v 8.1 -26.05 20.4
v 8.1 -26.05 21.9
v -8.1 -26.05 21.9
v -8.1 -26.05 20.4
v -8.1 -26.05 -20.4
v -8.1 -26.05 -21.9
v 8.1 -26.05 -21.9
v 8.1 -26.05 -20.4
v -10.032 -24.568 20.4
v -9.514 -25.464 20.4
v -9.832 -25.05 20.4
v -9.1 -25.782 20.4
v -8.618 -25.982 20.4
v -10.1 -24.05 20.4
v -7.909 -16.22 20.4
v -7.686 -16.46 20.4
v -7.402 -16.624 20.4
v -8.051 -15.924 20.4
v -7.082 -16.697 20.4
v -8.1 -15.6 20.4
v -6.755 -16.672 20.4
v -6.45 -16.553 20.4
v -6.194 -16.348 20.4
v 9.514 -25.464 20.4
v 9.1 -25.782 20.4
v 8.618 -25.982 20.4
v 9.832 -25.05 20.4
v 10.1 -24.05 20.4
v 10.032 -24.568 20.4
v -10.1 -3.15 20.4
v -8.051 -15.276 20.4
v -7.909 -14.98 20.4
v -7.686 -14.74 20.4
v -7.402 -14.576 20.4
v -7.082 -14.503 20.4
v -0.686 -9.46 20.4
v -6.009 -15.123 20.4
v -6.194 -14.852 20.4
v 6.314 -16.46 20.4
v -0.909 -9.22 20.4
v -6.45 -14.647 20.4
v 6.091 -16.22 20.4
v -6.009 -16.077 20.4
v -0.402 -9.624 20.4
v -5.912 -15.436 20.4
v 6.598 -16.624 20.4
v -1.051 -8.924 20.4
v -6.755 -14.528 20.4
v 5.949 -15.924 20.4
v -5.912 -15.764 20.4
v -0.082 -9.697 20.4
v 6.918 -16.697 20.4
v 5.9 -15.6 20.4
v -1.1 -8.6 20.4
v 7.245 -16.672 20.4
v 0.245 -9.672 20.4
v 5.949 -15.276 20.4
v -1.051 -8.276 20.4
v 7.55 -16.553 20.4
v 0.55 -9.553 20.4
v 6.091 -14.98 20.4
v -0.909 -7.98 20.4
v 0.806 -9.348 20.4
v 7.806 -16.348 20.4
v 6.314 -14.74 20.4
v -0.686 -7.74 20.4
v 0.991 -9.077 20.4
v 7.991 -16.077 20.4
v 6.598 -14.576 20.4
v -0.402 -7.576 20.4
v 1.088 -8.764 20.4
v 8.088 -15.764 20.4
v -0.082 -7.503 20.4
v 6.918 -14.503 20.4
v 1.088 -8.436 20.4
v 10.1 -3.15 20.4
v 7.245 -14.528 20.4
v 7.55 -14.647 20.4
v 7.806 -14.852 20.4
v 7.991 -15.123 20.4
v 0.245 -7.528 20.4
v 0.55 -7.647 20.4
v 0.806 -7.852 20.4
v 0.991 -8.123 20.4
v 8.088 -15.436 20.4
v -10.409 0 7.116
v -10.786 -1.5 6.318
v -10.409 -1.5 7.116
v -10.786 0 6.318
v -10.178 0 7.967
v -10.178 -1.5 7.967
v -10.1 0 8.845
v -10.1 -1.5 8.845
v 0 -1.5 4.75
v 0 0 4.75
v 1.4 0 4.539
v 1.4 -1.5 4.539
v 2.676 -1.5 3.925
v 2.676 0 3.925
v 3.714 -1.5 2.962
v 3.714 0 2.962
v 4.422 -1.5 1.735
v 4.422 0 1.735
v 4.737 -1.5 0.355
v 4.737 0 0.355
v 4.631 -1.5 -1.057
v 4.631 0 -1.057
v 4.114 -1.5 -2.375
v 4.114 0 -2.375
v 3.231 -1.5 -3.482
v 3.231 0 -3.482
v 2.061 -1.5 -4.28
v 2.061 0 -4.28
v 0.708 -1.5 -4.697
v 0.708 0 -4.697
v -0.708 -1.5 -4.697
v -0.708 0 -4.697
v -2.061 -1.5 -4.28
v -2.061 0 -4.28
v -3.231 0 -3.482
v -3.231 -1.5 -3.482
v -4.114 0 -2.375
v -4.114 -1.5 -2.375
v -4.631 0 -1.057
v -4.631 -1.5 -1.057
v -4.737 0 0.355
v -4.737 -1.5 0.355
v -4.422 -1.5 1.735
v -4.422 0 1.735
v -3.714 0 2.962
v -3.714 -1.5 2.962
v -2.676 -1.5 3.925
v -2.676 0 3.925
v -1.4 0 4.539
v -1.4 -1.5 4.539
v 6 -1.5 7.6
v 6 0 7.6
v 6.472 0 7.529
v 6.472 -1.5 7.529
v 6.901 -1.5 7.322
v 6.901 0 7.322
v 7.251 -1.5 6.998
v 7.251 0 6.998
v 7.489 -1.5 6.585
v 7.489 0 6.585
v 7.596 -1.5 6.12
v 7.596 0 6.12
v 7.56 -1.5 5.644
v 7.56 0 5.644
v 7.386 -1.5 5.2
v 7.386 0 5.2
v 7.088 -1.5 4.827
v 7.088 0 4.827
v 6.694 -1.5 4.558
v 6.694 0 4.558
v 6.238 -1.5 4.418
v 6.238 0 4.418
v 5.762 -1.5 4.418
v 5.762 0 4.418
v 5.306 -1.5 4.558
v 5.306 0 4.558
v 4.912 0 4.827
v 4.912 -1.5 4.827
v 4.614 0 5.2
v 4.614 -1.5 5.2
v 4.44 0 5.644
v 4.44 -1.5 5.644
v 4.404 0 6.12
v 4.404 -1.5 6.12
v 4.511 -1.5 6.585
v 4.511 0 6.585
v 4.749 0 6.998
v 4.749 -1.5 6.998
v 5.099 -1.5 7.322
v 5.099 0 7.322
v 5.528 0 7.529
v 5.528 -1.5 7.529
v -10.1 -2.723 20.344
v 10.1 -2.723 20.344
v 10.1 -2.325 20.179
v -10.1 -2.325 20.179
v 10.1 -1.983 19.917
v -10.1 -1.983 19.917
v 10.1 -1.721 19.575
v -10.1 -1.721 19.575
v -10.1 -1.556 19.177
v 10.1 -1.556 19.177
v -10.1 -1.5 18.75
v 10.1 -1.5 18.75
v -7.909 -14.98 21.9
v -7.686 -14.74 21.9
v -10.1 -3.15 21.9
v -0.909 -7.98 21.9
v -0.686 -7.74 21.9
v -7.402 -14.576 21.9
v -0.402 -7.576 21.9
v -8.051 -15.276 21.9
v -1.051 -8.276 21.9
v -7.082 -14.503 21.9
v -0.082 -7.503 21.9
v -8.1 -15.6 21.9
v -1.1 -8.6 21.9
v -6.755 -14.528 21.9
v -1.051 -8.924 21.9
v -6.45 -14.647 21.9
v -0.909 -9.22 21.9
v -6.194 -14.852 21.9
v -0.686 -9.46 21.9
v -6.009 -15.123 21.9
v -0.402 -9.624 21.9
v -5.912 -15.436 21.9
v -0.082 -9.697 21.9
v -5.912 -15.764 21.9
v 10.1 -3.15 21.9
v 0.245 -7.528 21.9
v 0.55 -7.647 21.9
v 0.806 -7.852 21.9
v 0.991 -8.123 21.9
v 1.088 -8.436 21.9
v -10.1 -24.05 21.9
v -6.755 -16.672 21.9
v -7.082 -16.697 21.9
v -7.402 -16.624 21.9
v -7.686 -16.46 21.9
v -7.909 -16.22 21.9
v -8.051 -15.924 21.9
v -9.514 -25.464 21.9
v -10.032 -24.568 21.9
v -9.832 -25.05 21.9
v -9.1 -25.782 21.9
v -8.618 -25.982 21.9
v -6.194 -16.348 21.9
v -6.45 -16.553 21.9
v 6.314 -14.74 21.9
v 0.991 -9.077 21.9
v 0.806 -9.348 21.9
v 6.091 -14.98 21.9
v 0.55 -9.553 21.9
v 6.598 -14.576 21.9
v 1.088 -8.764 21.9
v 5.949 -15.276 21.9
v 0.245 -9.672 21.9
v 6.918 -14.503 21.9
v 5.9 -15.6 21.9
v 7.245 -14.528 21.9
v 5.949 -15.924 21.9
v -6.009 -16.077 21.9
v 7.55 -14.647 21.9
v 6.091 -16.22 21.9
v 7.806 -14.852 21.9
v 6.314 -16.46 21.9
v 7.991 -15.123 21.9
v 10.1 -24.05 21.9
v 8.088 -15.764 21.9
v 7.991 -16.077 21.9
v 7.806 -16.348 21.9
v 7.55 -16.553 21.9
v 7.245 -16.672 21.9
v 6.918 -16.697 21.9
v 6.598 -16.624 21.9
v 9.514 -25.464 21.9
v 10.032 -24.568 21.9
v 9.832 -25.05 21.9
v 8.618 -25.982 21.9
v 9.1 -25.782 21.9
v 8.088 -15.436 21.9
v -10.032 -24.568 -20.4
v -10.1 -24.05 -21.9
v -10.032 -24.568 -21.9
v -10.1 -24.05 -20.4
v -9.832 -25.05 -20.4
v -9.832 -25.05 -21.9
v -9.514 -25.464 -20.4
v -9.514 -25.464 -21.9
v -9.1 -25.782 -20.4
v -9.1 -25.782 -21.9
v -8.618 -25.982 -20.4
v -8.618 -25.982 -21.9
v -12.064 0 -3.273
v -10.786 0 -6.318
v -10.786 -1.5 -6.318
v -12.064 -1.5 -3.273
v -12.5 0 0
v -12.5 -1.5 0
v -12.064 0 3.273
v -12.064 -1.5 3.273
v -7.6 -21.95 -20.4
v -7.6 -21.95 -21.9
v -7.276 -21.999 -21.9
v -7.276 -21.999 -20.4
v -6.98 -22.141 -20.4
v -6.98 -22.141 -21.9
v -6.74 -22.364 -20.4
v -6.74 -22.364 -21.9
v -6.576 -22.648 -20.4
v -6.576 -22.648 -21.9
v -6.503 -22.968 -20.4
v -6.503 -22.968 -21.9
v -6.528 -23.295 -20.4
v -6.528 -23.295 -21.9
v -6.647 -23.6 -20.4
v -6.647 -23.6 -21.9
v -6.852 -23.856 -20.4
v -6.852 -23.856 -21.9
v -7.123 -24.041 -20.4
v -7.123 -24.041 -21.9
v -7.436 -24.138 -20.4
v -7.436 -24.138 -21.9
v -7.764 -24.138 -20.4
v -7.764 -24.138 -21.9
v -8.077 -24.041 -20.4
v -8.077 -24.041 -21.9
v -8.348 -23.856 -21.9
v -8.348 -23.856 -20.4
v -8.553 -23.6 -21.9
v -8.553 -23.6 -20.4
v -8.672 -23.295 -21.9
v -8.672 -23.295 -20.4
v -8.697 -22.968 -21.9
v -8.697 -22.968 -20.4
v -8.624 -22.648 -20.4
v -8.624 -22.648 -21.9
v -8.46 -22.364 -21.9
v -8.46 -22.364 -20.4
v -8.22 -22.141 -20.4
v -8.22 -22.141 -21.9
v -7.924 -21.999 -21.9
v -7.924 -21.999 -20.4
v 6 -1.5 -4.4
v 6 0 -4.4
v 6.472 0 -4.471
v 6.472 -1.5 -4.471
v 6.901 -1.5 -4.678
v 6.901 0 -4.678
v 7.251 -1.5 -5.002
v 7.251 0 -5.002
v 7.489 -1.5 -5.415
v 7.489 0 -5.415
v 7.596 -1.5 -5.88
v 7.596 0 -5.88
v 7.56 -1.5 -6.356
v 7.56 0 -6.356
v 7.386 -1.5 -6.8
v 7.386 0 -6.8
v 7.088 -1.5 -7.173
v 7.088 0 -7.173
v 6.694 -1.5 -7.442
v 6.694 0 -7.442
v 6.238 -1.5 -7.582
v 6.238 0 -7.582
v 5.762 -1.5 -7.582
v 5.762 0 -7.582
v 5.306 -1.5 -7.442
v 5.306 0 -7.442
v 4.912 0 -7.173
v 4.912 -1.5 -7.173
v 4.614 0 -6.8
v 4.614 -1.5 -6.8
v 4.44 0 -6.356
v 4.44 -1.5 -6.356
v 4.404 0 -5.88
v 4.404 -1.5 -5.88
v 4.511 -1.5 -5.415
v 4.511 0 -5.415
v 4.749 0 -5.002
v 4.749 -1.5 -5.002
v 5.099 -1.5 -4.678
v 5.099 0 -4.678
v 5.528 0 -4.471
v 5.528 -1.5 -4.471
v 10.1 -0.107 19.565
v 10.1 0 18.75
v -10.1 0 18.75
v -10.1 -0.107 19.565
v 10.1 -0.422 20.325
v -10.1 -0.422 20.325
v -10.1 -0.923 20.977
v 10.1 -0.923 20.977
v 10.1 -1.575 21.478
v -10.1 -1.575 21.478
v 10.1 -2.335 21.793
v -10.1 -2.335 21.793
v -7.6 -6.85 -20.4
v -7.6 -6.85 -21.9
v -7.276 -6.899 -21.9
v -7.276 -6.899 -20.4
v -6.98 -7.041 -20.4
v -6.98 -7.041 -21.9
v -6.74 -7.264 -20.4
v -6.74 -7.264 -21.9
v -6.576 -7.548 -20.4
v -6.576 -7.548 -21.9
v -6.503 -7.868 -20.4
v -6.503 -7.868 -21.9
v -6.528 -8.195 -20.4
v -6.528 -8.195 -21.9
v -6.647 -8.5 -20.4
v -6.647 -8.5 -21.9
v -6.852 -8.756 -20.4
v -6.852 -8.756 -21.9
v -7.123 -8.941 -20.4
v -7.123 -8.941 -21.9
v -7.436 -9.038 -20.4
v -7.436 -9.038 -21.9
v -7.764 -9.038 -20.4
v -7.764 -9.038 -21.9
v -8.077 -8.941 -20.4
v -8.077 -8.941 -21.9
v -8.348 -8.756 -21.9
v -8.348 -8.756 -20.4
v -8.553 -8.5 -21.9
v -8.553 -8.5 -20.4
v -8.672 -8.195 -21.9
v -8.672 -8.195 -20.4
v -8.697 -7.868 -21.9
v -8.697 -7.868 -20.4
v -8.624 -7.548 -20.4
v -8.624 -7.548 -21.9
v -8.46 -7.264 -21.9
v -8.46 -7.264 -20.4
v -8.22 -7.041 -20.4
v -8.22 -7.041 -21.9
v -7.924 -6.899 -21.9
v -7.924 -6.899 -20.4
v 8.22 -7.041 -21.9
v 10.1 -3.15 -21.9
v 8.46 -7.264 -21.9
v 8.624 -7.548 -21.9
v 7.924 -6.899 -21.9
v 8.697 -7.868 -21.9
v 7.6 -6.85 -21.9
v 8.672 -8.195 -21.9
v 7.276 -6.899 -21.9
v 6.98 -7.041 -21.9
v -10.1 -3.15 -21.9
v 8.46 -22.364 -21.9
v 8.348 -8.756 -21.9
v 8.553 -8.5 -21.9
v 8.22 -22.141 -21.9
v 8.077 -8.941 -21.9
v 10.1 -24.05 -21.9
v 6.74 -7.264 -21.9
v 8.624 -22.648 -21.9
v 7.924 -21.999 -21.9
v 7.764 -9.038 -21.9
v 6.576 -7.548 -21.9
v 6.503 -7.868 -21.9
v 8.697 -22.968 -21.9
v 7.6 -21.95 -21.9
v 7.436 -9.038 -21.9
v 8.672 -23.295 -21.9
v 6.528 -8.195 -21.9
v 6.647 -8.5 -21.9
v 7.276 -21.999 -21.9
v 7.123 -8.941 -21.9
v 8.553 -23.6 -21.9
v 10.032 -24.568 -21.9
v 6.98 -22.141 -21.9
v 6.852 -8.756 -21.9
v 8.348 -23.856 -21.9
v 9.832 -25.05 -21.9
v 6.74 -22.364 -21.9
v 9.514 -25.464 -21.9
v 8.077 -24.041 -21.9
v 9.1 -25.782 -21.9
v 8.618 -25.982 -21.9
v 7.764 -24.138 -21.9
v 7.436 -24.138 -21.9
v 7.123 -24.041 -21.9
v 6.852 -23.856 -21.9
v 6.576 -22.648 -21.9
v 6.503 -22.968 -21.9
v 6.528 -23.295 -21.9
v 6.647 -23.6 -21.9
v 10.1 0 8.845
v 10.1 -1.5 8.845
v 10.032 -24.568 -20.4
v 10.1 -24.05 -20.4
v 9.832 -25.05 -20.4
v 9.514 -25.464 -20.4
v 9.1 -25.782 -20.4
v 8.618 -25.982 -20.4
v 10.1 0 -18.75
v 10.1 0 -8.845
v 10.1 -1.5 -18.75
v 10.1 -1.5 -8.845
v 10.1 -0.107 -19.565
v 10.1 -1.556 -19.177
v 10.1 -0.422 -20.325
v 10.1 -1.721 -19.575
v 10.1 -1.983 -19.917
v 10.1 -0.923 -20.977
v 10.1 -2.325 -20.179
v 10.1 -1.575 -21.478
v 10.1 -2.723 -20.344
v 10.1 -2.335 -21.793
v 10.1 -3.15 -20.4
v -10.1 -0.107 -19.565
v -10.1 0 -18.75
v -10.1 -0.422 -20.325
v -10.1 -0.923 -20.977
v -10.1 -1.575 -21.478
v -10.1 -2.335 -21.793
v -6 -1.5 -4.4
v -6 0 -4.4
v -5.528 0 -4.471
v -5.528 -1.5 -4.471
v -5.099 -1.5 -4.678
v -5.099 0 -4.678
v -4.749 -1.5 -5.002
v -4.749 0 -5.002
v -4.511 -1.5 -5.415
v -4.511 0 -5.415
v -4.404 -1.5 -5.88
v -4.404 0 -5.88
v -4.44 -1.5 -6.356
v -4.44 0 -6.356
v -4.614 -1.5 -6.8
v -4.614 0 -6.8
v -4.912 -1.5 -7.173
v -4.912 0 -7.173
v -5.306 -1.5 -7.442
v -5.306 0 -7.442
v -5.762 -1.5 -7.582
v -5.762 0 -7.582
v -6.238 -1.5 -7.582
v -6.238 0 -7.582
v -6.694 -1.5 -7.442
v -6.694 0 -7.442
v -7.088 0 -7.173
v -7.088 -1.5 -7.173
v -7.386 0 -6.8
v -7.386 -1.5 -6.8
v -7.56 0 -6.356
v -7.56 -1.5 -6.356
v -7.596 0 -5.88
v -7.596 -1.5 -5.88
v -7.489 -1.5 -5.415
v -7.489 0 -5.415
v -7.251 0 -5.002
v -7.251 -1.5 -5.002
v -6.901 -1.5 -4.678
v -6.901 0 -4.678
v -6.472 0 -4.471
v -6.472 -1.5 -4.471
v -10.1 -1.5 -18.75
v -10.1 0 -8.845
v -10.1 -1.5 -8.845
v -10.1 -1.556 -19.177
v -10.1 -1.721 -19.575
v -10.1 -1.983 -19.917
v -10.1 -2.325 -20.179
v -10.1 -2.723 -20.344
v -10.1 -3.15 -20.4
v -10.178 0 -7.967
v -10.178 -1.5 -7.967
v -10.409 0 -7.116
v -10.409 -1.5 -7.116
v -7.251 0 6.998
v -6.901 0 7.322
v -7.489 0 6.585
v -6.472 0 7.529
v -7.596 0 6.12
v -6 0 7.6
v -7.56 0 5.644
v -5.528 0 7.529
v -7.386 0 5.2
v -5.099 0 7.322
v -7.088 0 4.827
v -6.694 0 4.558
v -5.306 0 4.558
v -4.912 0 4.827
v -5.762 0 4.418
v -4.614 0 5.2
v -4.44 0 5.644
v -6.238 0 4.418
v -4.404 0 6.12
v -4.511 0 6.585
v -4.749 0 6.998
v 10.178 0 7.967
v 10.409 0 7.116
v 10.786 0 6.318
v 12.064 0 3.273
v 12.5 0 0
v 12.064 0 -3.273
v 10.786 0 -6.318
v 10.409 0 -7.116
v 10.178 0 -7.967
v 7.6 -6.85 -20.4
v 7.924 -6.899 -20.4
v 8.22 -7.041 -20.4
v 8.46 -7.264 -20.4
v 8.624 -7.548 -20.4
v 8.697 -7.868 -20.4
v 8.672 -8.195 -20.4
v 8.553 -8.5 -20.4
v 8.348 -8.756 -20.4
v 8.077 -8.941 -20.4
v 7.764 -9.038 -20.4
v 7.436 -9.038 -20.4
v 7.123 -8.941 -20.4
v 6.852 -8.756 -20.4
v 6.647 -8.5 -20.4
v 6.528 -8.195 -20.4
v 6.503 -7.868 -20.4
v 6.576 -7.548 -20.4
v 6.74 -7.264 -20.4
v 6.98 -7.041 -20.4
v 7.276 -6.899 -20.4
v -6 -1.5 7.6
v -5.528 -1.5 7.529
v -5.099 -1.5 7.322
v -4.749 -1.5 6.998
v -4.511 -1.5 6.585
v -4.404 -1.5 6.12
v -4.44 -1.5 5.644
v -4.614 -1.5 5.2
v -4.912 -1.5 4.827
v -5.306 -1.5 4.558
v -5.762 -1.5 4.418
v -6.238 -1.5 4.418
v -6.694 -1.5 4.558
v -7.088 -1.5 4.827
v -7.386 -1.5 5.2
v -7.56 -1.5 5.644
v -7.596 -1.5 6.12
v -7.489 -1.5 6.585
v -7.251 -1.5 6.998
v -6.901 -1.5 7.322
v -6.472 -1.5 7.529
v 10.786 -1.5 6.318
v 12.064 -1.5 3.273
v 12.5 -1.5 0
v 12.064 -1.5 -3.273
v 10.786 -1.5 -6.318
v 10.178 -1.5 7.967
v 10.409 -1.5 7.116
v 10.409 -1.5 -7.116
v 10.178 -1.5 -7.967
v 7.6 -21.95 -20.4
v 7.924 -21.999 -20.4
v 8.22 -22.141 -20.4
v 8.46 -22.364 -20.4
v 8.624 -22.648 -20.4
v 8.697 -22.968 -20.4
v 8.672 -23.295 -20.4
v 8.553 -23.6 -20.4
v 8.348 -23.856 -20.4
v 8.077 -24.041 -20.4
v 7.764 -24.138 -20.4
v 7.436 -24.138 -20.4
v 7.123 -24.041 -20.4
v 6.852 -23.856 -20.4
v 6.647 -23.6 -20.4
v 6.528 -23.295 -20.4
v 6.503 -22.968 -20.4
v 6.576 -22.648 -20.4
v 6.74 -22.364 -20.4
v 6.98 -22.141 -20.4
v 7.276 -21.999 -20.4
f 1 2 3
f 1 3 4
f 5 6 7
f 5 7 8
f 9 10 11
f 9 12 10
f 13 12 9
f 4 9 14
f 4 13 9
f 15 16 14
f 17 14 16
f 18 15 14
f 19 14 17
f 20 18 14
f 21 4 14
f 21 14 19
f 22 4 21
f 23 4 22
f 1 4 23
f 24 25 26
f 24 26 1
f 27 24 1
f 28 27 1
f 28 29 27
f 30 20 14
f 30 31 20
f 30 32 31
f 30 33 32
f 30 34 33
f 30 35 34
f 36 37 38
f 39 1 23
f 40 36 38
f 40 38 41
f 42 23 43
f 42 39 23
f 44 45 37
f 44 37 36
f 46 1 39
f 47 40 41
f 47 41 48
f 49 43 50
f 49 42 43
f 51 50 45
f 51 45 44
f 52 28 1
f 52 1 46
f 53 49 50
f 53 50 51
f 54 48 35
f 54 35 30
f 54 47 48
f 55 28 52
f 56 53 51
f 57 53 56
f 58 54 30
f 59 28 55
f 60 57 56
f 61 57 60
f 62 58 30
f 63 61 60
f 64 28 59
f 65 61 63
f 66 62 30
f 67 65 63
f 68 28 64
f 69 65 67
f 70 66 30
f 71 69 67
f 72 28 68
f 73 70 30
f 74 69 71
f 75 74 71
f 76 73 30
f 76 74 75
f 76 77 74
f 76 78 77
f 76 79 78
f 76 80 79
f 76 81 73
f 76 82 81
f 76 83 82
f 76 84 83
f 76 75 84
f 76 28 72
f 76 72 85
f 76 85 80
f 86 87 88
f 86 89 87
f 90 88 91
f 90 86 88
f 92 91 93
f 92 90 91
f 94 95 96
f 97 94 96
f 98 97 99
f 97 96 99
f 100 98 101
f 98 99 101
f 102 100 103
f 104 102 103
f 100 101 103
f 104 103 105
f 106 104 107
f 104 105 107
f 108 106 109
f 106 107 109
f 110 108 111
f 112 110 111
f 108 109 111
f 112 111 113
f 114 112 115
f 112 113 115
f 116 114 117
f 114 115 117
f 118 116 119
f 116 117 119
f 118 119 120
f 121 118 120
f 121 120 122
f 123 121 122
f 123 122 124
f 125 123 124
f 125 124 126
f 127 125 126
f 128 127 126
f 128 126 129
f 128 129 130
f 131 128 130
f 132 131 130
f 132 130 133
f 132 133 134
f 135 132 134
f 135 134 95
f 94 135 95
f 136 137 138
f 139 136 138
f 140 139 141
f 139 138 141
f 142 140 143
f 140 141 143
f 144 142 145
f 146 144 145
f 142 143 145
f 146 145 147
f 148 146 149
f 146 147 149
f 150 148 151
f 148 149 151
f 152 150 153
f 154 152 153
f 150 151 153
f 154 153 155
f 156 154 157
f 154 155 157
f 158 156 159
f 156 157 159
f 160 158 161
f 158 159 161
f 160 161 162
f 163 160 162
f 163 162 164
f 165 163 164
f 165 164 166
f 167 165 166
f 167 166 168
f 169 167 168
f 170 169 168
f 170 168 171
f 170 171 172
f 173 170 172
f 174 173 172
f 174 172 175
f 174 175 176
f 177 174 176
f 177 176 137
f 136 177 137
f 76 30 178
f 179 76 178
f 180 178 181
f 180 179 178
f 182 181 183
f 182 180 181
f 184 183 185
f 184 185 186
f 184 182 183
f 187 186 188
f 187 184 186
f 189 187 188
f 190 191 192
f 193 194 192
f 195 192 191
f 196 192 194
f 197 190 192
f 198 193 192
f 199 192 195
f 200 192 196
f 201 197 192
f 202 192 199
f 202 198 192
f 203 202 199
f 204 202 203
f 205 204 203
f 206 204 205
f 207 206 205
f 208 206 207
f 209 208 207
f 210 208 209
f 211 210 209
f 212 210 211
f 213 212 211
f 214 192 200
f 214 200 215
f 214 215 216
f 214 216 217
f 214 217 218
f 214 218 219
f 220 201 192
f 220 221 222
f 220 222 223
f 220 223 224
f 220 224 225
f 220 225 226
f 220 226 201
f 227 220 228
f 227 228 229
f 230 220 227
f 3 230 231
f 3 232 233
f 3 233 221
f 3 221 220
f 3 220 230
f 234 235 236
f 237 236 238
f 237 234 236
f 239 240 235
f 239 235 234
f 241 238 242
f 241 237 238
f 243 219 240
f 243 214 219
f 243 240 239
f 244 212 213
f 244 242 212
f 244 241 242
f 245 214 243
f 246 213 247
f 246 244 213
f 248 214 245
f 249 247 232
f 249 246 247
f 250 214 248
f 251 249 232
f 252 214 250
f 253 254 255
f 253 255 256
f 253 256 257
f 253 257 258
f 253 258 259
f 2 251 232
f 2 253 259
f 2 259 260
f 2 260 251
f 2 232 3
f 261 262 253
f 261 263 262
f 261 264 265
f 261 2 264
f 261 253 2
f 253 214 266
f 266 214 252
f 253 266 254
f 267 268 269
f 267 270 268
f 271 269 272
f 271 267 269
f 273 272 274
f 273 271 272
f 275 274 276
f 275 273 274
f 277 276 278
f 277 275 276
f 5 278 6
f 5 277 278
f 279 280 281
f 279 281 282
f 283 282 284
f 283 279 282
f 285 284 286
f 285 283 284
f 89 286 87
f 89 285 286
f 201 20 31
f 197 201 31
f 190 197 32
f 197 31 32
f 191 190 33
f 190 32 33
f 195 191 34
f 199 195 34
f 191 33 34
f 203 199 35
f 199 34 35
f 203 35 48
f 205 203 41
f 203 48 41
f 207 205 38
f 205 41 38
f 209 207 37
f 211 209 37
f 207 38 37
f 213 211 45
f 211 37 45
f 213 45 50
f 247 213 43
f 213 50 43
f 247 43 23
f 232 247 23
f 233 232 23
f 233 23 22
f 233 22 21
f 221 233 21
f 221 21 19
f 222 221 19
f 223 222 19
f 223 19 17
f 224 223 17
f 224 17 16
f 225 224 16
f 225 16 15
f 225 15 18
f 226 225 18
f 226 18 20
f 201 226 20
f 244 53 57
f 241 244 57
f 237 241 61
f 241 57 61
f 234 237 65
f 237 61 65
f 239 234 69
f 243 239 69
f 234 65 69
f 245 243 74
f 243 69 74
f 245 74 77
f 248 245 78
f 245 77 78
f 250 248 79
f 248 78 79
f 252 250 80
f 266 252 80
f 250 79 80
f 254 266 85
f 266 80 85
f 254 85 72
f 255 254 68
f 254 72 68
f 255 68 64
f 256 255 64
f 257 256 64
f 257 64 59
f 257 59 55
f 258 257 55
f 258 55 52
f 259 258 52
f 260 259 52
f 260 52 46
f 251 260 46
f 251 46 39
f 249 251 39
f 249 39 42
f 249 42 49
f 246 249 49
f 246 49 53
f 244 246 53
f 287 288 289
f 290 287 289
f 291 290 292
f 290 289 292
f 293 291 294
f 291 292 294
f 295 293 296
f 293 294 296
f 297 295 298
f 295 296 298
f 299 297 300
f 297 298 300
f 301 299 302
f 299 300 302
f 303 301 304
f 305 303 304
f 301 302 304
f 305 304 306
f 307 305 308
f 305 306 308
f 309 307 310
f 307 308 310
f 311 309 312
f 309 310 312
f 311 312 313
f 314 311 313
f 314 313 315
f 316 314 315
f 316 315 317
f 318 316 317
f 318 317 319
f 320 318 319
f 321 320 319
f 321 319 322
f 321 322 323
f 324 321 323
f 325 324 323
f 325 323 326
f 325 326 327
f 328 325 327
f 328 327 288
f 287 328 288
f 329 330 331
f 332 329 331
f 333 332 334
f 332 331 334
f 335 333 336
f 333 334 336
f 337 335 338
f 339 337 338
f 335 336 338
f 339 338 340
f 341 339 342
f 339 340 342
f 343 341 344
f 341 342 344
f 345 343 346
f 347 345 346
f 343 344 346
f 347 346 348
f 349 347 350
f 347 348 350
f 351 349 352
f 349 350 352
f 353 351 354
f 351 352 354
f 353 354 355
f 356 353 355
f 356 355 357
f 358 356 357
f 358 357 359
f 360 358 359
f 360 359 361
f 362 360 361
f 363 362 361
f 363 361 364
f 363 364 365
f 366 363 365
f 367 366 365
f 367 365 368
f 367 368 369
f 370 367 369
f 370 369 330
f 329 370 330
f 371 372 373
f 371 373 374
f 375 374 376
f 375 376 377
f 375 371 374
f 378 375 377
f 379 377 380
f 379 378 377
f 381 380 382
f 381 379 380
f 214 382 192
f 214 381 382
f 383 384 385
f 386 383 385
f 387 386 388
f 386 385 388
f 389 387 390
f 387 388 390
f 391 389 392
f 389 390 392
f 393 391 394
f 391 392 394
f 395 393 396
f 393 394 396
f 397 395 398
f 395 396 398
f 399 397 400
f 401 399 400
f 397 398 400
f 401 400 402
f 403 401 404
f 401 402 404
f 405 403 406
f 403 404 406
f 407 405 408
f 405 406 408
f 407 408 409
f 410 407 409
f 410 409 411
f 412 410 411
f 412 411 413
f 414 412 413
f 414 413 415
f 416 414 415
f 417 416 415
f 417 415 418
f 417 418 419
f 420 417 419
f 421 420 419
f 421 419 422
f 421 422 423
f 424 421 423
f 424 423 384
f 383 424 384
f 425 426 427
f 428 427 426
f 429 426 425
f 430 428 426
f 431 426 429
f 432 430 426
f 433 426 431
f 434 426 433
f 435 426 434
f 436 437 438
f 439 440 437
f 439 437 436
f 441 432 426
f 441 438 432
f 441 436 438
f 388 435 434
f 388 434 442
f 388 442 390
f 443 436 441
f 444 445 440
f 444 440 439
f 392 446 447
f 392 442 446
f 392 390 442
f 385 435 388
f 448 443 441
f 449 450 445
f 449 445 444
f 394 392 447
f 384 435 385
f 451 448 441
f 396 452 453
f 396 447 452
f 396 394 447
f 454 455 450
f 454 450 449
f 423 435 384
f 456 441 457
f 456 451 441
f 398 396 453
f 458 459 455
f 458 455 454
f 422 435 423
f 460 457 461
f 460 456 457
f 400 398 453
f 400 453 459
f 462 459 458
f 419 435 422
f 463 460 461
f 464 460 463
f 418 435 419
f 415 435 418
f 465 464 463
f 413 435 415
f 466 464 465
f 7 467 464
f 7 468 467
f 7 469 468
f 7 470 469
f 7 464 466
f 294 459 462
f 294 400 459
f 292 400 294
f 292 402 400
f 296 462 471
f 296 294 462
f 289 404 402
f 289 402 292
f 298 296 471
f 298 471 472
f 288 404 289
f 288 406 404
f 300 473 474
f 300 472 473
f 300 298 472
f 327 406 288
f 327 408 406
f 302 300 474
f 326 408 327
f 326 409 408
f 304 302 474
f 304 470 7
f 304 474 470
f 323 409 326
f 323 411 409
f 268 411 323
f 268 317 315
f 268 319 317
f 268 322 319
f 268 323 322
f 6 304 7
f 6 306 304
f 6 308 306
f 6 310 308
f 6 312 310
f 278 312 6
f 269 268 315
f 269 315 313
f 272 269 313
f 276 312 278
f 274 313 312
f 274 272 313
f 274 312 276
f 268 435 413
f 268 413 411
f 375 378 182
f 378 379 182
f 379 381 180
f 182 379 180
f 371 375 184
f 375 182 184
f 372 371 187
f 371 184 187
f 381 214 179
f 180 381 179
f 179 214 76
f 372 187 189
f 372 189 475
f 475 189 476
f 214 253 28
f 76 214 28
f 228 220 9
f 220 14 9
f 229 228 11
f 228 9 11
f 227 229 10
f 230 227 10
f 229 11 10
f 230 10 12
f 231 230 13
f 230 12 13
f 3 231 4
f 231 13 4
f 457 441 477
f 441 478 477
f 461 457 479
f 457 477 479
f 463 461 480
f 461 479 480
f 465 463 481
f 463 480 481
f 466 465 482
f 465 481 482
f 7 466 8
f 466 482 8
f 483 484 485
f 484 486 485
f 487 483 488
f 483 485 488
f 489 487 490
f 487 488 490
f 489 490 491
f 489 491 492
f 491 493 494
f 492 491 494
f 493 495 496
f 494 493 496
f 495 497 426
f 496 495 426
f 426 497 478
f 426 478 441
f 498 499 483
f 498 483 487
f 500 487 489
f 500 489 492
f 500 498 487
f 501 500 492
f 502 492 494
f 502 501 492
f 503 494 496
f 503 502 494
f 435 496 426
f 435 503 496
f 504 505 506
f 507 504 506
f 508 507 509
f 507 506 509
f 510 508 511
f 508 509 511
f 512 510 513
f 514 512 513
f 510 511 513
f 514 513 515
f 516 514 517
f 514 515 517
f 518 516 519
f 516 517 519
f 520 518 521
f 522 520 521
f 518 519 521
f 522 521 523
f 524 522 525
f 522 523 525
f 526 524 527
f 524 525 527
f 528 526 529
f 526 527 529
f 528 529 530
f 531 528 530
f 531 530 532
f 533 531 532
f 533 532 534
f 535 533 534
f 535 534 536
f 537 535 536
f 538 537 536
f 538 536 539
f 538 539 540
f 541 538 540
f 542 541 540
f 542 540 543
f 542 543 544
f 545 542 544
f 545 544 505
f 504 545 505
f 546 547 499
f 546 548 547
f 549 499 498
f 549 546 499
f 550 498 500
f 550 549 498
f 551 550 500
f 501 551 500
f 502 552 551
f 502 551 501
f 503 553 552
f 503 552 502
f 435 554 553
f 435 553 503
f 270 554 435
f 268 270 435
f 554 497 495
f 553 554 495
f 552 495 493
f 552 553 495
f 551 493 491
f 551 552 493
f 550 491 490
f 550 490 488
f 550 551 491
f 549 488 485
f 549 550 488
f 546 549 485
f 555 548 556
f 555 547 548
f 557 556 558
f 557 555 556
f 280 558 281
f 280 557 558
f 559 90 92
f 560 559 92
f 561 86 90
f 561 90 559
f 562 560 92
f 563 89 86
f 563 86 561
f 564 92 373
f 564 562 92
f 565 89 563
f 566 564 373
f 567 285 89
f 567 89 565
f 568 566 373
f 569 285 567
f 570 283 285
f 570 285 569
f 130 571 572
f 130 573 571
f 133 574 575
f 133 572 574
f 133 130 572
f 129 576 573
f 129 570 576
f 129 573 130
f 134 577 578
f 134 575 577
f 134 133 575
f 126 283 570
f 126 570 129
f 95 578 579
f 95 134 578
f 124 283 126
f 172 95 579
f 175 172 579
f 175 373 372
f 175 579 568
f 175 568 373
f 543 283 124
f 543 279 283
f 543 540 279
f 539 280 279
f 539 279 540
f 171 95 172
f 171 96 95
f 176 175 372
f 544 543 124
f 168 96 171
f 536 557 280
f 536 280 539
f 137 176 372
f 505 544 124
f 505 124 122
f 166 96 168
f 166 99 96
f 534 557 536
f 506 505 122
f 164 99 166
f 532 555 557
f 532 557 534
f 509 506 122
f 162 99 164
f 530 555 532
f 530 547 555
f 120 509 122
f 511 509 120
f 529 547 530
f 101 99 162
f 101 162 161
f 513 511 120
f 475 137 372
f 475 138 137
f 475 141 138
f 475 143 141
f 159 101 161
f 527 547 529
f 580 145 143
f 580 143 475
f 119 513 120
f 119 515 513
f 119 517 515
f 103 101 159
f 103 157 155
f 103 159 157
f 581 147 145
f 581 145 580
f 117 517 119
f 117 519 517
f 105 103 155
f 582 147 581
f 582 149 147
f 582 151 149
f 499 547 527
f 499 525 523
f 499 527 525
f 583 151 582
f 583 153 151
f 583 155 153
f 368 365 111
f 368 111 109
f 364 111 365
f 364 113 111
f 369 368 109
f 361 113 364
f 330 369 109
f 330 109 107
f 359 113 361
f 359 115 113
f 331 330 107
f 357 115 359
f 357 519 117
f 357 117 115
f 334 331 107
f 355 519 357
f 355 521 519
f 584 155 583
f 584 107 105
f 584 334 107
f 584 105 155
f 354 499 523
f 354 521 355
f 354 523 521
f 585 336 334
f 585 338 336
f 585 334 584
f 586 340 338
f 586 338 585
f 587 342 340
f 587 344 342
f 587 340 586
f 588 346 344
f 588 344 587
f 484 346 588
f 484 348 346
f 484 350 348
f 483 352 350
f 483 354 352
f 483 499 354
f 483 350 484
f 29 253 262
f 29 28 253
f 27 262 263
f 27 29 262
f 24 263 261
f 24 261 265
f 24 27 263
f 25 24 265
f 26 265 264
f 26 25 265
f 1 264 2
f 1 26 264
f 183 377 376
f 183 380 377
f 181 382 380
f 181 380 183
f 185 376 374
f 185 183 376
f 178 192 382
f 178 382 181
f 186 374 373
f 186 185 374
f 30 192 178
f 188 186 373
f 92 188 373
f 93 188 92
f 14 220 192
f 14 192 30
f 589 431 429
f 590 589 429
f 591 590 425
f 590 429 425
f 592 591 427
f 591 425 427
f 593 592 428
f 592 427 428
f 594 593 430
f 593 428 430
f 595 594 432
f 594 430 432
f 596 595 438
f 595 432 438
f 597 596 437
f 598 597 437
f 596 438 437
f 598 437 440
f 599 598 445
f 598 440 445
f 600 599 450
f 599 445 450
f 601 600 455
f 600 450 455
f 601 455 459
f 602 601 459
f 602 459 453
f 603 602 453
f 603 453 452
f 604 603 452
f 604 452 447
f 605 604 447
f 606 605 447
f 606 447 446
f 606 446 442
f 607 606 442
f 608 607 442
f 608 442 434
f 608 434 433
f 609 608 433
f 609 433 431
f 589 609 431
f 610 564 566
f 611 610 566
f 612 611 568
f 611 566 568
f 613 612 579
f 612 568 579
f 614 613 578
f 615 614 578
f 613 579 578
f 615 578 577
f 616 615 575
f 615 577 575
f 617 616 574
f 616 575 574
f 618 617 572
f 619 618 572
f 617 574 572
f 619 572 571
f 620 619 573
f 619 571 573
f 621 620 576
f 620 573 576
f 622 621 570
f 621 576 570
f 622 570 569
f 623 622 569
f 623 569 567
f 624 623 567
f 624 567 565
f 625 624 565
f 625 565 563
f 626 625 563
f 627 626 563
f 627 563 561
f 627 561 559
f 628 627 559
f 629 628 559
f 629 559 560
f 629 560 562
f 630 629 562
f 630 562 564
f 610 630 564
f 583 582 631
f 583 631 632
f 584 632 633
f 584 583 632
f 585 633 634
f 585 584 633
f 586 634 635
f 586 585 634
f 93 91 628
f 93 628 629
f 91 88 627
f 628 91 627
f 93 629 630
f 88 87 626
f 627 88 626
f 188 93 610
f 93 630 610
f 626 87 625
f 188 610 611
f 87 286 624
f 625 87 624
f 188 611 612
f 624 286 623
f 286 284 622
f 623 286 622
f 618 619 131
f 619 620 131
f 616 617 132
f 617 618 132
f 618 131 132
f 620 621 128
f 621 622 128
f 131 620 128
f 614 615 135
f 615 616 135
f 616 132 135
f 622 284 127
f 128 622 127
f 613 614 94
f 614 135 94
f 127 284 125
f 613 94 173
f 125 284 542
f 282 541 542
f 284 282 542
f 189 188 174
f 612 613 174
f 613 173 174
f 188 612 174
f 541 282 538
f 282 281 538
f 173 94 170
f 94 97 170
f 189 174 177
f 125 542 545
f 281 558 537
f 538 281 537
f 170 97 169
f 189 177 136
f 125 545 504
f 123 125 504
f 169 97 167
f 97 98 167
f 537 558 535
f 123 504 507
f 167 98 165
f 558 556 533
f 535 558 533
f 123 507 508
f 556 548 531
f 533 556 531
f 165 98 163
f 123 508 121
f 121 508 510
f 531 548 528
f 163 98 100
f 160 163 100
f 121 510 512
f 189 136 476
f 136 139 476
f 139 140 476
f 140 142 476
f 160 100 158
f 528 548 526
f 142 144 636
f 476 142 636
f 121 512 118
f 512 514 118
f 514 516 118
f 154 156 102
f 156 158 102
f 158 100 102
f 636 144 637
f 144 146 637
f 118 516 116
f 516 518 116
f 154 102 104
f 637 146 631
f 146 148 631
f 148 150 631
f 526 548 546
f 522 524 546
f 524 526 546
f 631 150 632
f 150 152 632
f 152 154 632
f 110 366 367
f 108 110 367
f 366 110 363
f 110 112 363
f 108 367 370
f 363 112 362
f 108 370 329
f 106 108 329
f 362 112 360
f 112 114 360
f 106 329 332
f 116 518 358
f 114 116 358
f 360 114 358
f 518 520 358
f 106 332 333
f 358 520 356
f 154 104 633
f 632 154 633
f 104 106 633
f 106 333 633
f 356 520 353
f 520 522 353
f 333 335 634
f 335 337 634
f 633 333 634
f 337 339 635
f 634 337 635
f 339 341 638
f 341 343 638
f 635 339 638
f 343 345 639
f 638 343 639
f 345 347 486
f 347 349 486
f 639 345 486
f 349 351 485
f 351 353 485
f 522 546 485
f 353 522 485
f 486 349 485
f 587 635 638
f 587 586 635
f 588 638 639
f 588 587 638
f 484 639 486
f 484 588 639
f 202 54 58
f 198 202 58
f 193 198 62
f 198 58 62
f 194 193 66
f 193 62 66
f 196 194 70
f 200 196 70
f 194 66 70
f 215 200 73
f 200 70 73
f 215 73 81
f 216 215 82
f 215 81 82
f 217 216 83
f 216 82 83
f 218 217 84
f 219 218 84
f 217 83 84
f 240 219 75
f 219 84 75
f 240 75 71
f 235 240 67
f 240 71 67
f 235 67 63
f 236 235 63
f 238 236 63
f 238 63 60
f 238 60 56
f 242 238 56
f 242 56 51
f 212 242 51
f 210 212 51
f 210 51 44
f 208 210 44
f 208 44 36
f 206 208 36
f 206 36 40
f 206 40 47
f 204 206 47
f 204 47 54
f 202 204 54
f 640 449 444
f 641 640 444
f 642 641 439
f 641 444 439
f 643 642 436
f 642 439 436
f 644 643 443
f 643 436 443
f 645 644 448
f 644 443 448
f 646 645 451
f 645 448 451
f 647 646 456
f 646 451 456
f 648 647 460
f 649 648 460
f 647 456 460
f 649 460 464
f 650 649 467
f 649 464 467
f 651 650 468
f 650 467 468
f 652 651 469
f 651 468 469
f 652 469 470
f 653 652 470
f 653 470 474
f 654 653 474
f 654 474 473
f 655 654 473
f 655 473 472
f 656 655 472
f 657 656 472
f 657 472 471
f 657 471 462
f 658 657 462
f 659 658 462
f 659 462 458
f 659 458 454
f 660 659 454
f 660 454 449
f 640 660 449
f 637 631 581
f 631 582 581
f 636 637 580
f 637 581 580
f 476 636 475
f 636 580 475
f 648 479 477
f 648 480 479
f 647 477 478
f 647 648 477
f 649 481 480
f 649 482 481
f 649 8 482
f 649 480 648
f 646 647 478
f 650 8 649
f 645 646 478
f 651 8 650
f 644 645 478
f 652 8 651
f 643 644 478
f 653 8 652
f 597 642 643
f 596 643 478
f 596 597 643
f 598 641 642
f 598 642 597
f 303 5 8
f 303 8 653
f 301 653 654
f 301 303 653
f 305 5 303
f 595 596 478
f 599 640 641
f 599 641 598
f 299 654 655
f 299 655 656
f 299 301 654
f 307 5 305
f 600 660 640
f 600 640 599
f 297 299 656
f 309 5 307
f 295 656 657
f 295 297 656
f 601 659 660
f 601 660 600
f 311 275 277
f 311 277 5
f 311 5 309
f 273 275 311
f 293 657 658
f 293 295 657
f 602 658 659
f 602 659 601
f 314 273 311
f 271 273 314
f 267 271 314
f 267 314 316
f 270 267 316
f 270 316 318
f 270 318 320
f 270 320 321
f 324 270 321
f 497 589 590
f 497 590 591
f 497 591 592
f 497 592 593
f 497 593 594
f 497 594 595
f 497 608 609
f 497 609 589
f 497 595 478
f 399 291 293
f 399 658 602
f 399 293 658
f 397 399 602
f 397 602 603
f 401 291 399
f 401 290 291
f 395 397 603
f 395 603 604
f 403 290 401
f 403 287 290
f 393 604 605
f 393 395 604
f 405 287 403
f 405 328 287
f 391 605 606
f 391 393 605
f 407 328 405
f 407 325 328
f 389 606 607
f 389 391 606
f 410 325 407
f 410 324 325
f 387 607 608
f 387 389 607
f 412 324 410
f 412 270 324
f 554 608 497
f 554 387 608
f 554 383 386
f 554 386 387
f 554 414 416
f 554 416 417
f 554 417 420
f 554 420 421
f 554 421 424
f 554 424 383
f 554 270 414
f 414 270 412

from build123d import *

# Parameters (mm, degrees)
SKETCH1_W                      = 20.2
SKETCH1_H                      = 40.8
BASE_FLANGE1_DEPTH             = 1.5
EDGE_FLANGE1_STRIP_W           = 9.3
EDGE_FLANGE1_STRIP_H           = 1.5
EDGE_FLANGE1_STRIP_CUT_DEPTH   = 20.2
EDGE_FLANGE1_STRIP_2_W         = 9.3
EDGE_FLANGE1_STRIP_2_H         = 1.5
EDGE_FLANGE1_STRIP_CUT_2_DEPTH = 20.2
EDGE_FLANGE1_DEPTH             = 20.2
EDGE_FLANGE1_BEND_DEPTH        = 20.2
CUT_EXTRUDE1_REACH             = 53.952
SKETCH12_R                     = 1.1
FILLET1_R                      = 2
F_2_0MM_DOWEL_HOLE1_D          = 2.2
F_2_0MM_DOWEL_HOLE1_DEPTH      = 1.5
SKETCH15_R                     = 12.5
TAB1_DEPTH                     = 1.5
FILLET2_R                      = 5
CUT_EXTRUDE2_REACH             = 38.256
SKETCH18_R                     = 1.6
SKETCH18_R_2                   = 4.75


# Sheet-metal steps are written as plain solids
with BuildPart() as part:
    # Sketch1 → Base-Flange1 (new body)
    with BuildSketch(Plane(origin=(0, 0, 0), x_dir=(1, 0, 0), z_dir=(0, 1, 0))):
        Rectangle(SKETCH1_W, SKETCH1_H)
    extrude(amount=-BASE_FLANGE1_DEPTH)

    # Edge-Flange1 strip (across the edge) → Edge-Flange1 strip cut (cut)
    with BuildSketch(Plane(origin=(10.1, -1.5, 20.4), x_dir=(0, 0, -1), z_dir=(-1, 0, 0))):
        with Locations((-3, -0.75)):
            Rectangle(EDGE_FLANGE1_STRIP_W, EDGE_FLANGE1_STRIP_H)
    extrude(amount=EDGE_FLANGE1_STRIP_CUT_DEPTH, mode=Mode.SUBTRACT)

    # Edge-Flange1 strip 2 (across the edge) → Edge-Flange1 strip cut 2 (cut)
    with BuildSketch(Plane(origin=(-10.1, -1.5, -20.4), x_dir=(0, 0, 1), z_dir=(1, 0, 0))):
        with Locations((-3, -0.75)):
            Rectangle(EDGE_FLANGE1_STRIP_2_W, EDGE_FLANGE1_STRIP_2_H)
    extrude(amount=EDGE_FLANGE1_STRIP_CUT_2_DEPTH, mode=Mode.SUBTRACT)

    # Edge-Flange1 section (across the edge) → Edge-Flange1 (add)
    with BuildSketch(Plane(origin=(10.1, -1.5, 20.4), x_dir=(0, 0, -1), z_dir=(-1, 0, 0))):
        with BuildLine():
            Line((-1.5, 1.65), (-1.5, 24.55))
            Line((-1.5, 24.55), (0, 24.55))
            Line((0, 24.55), (0, 1.65))
            ThreePointArc((0, 1.65), (0.483273811, 0.483273811), (1.65, 0))
            Line((1.65, 0), (1.65, -1.5))
            ThreePointArc((1.65, -1.5), (-0.577386361, -0.577386361), (-1.5, 1.65))
        make_face()
    extrude(amount=EDGE_FLANGE1_DEPTH)

    # Edge-Flange1 section 2 (across the edge) → Edge-Flange1 bend (add)
    with BuildSketch(Plane(origin=(-10.1, -1.5, -20.4), x_dir=(0, 0, 1), z_dir=(1, 0, 0))):
        with BuildLine():
            Line((-1.5, 1.65), (-1.5, 24.55))
            Line((-1.5, 24.55), (0, 24.55))
            Line((0, 24.55), (0, 1.65))
            ThreePointArc((0, 1.65), (0.483273811, 0.483273811), (1.65, 0))
            Line((1.65, 0), (1.65, -1.5))
            ThreePointArc((1.65, -1.5), (-0.577386361, -0.577386361), (-1.5, 1.65))
        make_face()
    extrude(amount=EDGE_FLANGE1_BEND_DEPTH)

    # Sketch12 → Cut-Extrude1 (cut, up to next)
    with BuildSketch(Plane(origin=(0, 0, -21.9), x_dir=(-1, 0, 0), z_dir=(0, 0, -1)), mode=Mode.PRIVATE) as cut_extrude1_sk1:
        with Locations(Location((-7.6, -7.95, 0), (0, 0, 90))):
            Circle(SKETCH12_R)
    cut_extrude1_tool1 = extrude(cut_extrude1_sk1.sketch, amount=-CUT_EXTRUDE1_REACH, mode=Mode.PRIVATE) & part.part
    # Sketch12 → Cut-Extrude1 (cut, up to next)
    with BuildSketch(Plane(origin=(0, 0, -21.9), x_dir=(-1, 0, 0), z_dir=(0, 0, -1)), mode=Mode.PRIVATE) as cut_extrude1_sk2:
        with Locations(Location((7.6, -7.95, 0), (0, 0, 90))):
            Circle(SKETCH12_R)
    cut_extrude1_tool2 = extrude(cut_extrude1_sk2.sketch, amount=-CUT_EXTRUDE1_REACH, mode=Mode.PRIVATE) & part.part
    # Sketch12 → Cut-Extrude1 (cut, up to next)
    with BuildSketch(Plane(origin=(0, 0, -21.9), x_dir=(-1, 0, 0), z_dir=(0, 0, -1)), mode=Mode.PRIVATE) as cut_extrude1_sk3:
        with Locations(Location((7.6, -23.05, 0), (0, 0, 90))):
            Circle(SKETCH12_R)
    cut_extrude1_tool3 = extrude(cut_extrude1_sk3.sketch, amount=-CUT_EXTRUDE1_REACH, mode=Mode.PRIVATE) & part.part
    # Sketch12 → Cut-Extrude1 (cut, up to next)
    with BuildSketch(Plane(origin=(0, 0, -21.9), x_dir=(-1, 0, 0), z_dir=(0, 0, -1)), mode=Mode.PRIVATE) as cut_extrude1_sk4:
        with Locations(Location((-7.6, -23.05, 0), (0, 0, 90))):
            Circle(SKETCH12_R)
    cut_extrude1_tool4 = extrude(cut_extrude1_sk4.sketch, amount=-CUT_EXTRUDE1_REACH, mode=Mode.PRIVATE) & part.part
    add(cut_extrude1_tool1.solids().sort_by_distance((7.6, -7.95, -21.9))[0], mode=Mode.SUBTRACT)
    add(cut_extrude1_tool2.solids().sort_by_distance((-7.6, -7.95, -21.9))[0], mode=Mode.SUBTRACT)
    add(cut_extrude1_tool3.solids().sort_by_distance((-7.6, -23.05, -21.9))[0], mode=Mode.SUBTRACT)
    add(cut_extrude1_tool4.solids().sort_by_distance((7.6, -23.05, -21.9))[0], mode=Mode.SUBTRACT)

    # Fillet1
    fillet1_edges = [part.edges().sort_by_distance(p)[0] for p in [
        (10.1, -26.05, 21.15),
        (-10.1, -26.05, 21.15),
        (-10.1, -26.05, -21.15),
        (10.1, -26.05, -21.15),
    ]]
    fillet(fillet1_edges, radius=FILLET1_R)

    # Ø2.0mm Dowel Hole1
    with Locations(Plane.XY.offset(21.9)):
        with Locations((-7, -15.6), (0, -8.6), (7, -15.6)):
            Hole(F_2_0MM_DOWEL_HOLE1_D / 2, depth=F_2_0MM_DOWEL_HOLE1_DEPTH)

    # Sketch15 → Tab1 (add)
    with BuildSketch(Plane(origin=(0, 0, 0), x_dir=(1, 0, 0), z_dir=(0, 1, 0))):
        Circle(SKETCH15_R)
    extrude(amount=-TAB1_DEPTH)

    # Fillet2
    fillet2_edges = [part.edges().sort_by_distance(p)[0] for p in [
        (-10.1, -0.75, -7.364781056),
        (-10.1, -0.75, 7.364781056),
        (10.1, -0.75, -7.364781056),
        (10.1, -0.75, 7.364781056),
    ]]
    fillet(fillet2_edges, radius=FILLET2_R)

    # Sketch18 → Cut-Extrude2 (cut, up to next)
    with BuildSketch(Plane(origin=(0, 0, 0), x_dir=(1, 0, 0), z_dir=(0, 1, 0)), mode=Mode.PRIVATE) as cut_extrude2_sk1:
        with Locations(Location((-6, 6, 0), (0, 0, 270))):
            Circle(SKETCH18_R)
    cut_extrude2_tool1 = extrude(cut_extrude2_sk1.sketch, amount=-CUT_EXTRUDE2_REACH, mode=Mode.PRIVATE) & part.part
    # Sketch18 → Cut-Extrude2 (cut, up to next)
    with BuildSketch(Plane(origin=(0, 0, 0), x_dir=(1, 0, 0), z_dir=(0, 1, 0)), mode=Mode.PRIVATE) as cut_extrude2_sk2:
        with Locations(Location((6, 6, 0), (0, 0, 270))):
            Circle(SKETCH18_R)
    cut_extrude2_tool2 = extrude(cut_extrude2_sk2.sketch, amount=-CUT_EXTRUDE2_REACH, mode=Mode.PRIVATE) & part.part
    # Sketch18 → Cut-Extrude2 (cut, up to next)
    with BuildSketch(Plane(origin=(0, 0, 0), x_dir=(1, 0, 0), z_dir=(0, 1, 0)), mode=Mode.PRIVATE) as cut_extrude2_sk3:
        with Locations(Location((-6, -6, 0), (0, 0, 270))):
            Circle(SKETCH18_R)
    cut_extrude2_tool3 = extrude(cut_extrude2_sk3.sketch, amount=-CUT_EXTRUDE2_REACH, mode=Mode.PRIVATE) & part.part
    # Sketch18 → Cut-Extrude2 (cut, up to next)
    with BuildSketch(Plane(origin=(0, 0, 0), x_dir=(1, 0, 0), z_dir=(0, 1, 0)), mode=Mode.PRIVATE) as cut_extrude2_sk4:
        with Locations(Location((6, -6, 0), (0, 0, 270))):
            Circle(SKETCH18_R)
    cut_extrude2_tool4 = extrude(cut_extrude2_sk4.sketch, amount=-CUT_EXTRUDE2_REACH, mode=Mode.PRIVATE) & part.part
    # Sketch18 → Cut-Extrude2 (cut, up to next)
    with BuildSketch(Plane(origin=(0, 0, 0), x_dir=(1, 0, 0), z_dir=(0, 1, 0)), mode=Mode.PRIVATE) as cut_extrude2_sk5:
        with Locations(Location((0, 0, 0), (0, 0, 270))):
            Circle(SKETCH18_R_2)
    cut_extrude2_tool5 = extrude(cut_extrude2_sk5.sketch, amount=-CUT_EXTRUDE2_REACH, mode=Mode.PRIVATE) & part.part
    add(cut_extrude2_tool1.solids().sort_by_distance((-6, 0, -6))[0], mode=Mode.SUBTRACT)
    add(cut_extrude2_tool2.solids().sort_by_distance((6, 0, -6))[0], mode=Mode.SUBTRACT)
    add(cut_extrude2_tool3.solids().sort_by_distance((-6, 0, 6))[0], mode=Mode.SUBTRACT)
    add(cut_extrude2_tool4.solids().sort_by_distance((6, 0, 6))[0], mode=Mode.SUBTRACT)
    add(cut_extrude2_tool5.solids().sort_by_distance((0, 0, 0))[0], mode=Mode.SUBTRACT)


solid = part.part
